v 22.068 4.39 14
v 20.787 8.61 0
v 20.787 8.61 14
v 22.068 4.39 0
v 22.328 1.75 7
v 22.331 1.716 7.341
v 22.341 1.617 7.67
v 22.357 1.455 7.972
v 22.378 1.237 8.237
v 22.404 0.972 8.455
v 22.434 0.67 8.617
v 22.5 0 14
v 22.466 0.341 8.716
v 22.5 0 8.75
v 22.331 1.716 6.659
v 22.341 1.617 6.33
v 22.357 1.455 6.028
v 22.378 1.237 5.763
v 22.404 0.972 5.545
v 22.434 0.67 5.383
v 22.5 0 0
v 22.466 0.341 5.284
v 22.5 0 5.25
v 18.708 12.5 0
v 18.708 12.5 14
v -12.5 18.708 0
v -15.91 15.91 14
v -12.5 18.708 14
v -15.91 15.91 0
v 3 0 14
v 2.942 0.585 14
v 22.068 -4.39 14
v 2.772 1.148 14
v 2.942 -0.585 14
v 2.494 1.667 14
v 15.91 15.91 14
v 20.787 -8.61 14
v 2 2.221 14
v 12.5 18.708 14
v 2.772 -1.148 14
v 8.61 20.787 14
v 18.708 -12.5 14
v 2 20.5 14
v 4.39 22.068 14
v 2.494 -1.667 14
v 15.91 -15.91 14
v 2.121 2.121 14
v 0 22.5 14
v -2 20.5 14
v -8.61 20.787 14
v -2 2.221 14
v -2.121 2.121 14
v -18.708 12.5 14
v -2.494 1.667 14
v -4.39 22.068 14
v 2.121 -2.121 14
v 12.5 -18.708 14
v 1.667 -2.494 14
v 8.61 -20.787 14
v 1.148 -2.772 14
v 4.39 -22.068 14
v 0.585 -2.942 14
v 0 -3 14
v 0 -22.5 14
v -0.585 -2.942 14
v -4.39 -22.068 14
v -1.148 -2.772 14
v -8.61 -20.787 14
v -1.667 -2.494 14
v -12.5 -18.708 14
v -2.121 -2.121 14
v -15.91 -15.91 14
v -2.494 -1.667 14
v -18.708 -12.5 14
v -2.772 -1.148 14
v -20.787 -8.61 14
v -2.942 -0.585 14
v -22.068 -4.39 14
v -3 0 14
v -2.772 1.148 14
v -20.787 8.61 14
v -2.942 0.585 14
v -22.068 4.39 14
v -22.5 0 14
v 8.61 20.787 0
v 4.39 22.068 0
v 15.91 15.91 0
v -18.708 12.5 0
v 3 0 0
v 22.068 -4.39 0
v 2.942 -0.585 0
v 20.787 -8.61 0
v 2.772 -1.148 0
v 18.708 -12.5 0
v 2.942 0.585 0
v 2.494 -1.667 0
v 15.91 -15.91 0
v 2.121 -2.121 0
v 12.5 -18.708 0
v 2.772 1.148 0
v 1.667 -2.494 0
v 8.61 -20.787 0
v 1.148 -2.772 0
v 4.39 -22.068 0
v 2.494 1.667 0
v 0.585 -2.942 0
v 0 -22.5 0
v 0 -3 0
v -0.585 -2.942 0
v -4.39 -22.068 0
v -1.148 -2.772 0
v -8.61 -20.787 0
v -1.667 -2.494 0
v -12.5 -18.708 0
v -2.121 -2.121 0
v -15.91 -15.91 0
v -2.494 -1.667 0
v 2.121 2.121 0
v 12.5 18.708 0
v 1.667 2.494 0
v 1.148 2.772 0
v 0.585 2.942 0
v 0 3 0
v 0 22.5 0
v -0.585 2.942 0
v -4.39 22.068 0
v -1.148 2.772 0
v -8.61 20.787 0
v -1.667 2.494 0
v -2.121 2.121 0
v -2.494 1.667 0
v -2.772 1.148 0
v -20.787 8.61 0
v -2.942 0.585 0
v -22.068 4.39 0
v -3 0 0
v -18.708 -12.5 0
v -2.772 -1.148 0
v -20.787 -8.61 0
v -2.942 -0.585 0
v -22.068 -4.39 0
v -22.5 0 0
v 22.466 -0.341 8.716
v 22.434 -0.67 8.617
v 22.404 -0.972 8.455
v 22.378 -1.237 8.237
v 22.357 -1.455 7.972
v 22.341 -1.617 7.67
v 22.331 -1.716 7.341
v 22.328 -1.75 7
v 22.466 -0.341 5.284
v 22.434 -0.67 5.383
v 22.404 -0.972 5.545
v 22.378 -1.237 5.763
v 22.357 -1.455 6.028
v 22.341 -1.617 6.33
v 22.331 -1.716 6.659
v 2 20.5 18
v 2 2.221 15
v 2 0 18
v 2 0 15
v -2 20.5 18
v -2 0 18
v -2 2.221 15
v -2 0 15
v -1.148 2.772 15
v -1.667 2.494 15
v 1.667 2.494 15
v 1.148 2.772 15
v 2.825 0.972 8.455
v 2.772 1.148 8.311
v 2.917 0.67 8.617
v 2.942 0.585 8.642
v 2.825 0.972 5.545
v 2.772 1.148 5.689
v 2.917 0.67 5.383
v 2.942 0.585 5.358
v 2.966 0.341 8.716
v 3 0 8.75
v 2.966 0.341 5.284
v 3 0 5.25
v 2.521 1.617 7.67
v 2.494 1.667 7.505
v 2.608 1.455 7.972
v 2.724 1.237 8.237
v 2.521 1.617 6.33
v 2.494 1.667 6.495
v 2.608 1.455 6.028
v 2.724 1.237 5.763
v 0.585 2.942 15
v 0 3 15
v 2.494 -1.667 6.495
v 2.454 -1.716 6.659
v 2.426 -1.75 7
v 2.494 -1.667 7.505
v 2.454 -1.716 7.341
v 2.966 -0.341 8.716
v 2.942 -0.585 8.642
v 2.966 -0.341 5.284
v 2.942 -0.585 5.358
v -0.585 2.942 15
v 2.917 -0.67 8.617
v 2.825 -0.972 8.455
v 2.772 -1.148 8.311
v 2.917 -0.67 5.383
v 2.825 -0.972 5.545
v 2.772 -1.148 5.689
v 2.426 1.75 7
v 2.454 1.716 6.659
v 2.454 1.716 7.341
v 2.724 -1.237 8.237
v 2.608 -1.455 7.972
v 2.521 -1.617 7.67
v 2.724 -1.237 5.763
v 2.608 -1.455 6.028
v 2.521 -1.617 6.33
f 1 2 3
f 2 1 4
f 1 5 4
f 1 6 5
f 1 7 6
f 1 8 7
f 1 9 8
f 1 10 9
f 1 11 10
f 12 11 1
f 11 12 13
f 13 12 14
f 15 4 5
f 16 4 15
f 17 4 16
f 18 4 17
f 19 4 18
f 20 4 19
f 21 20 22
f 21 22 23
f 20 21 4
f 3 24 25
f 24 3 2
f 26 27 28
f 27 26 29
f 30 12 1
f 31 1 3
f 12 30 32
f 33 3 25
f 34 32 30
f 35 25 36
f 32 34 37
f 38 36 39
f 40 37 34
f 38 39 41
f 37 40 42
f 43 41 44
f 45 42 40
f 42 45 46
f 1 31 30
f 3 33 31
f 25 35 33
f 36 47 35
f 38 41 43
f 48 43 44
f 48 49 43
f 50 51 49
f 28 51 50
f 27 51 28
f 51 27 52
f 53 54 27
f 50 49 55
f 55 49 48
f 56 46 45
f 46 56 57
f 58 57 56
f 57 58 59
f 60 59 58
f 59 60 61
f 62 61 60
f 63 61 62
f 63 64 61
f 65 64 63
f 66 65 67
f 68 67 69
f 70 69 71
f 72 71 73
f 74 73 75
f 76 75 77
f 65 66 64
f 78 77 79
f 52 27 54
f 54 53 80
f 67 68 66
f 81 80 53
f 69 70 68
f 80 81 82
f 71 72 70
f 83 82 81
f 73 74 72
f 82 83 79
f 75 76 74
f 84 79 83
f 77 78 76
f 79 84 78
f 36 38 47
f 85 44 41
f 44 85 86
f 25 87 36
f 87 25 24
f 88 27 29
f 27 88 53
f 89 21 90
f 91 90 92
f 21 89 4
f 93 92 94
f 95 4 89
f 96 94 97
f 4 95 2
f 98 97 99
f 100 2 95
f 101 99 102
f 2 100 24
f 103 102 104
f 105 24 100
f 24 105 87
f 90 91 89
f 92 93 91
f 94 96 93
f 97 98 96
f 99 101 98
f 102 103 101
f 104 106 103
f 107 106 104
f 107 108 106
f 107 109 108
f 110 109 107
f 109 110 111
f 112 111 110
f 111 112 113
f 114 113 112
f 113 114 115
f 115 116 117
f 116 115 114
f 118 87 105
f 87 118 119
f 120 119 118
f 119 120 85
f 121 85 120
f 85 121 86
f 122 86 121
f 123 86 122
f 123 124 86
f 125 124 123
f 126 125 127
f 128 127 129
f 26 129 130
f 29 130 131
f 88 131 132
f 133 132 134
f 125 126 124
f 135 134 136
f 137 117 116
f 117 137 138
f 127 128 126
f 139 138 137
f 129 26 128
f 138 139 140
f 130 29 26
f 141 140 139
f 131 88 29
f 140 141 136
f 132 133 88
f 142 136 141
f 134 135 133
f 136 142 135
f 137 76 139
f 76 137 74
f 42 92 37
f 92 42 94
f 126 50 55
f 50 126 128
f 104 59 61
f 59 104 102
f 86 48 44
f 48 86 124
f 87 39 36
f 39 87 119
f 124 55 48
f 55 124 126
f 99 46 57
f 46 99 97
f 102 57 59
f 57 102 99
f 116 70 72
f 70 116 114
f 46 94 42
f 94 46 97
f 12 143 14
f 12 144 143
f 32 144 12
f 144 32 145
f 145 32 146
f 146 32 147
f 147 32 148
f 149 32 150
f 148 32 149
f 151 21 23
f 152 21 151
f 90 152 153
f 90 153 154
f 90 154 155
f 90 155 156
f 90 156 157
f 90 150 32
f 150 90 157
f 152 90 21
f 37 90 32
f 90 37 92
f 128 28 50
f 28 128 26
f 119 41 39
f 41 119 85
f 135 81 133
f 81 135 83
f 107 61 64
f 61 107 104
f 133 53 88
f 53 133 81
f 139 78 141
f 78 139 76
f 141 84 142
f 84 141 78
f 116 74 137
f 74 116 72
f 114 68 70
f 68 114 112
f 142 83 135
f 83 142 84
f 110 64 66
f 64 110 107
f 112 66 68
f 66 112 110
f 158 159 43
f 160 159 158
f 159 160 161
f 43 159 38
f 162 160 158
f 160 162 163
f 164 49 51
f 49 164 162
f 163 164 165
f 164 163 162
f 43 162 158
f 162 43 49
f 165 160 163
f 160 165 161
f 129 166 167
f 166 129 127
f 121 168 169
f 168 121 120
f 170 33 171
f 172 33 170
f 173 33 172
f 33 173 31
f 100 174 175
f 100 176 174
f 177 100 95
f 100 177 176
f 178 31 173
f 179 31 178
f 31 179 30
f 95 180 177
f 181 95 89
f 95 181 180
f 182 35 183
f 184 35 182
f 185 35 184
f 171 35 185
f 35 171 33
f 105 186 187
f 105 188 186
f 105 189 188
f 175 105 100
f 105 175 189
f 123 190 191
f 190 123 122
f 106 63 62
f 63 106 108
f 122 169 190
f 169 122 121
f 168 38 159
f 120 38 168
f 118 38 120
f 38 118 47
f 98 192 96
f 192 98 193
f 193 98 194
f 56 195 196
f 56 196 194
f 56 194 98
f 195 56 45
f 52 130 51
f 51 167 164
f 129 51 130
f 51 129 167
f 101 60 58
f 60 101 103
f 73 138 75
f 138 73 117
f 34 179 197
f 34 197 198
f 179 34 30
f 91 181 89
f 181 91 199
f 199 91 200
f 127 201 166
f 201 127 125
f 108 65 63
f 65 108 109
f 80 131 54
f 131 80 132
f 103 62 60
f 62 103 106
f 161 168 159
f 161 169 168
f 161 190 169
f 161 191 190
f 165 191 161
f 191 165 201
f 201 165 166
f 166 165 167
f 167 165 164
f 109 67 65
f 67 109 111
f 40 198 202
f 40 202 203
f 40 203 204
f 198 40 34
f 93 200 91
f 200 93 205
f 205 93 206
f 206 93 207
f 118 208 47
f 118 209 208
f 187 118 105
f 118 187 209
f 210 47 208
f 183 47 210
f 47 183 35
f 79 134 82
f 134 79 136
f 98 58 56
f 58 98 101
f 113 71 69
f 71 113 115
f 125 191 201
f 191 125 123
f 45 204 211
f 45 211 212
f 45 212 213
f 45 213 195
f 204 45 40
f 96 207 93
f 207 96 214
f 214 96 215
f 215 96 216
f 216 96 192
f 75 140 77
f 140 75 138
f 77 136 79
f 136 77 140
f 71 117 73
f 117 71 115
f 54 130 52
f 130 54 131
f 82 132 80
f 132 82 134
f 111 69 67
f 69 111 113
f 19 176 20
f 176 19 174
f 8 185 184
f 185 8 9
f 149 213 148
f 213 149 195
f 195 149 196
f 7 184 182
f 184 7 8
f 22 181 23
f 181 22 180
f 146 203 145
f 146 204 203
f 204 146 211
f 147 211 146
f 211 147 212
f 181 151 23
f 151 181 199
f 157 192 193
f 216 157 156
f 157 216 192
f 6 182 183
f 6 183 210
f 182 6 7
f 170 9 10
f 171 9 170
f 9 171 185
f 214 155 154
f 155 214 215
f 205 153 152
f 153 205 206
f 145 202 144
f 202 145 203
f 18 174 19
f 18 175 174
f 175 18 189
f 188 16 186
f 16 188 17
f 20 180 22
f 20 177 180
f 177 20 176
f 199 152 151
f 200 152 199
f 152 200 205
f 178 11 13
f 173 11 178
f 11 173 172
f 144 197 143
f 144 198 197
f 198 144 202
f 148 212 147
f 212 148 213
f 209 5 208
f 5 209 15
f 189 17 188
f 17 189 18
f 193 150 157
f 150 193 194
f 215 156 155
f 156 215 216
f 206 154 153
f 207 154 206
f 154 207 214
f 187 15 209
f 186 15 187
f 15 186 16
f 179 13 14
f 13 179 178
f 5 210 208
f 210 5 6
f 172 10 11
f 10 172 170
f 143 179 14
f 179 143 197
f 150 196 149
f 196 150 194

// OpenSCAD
$fn = 32;

// ----------------------------------------------------------------------
// Control knob: pointer knob
// ----------------------------------------------------------------------

// --- parameters (mm) ---
rib_w = 4;                // pointer rib width
rib_h = 5;                // pointer rib height
knob_d = 45;              // knob body diameter
knob_h = 14;              // knob body height
bore_d = 6;               // shaft bore diameter
set_d = 3.5;              // set screw bore diameter

rib_poke = rib_h - 1;  // rib height above the top
total_h = knob_h + rib_h - 1;  // overall height

difference() {
  union() {
    cylinder(h = knob_h, d = knob_d);
    translate([-rib_w / 2, 0, knob_h - 1])
      cube([rib_w, knob_d / 2 - 2, rib_h]);
  }
  translate([0, 0, -1]) cylinder(h = knob_h + 2, d = bore_d);
  translate([-1, 0, knob_h / 2]) rotate([0, 90, 0])
    cylinder(h = knob_d / 2 + bore_d / 2 + 2, d = set_d);}
